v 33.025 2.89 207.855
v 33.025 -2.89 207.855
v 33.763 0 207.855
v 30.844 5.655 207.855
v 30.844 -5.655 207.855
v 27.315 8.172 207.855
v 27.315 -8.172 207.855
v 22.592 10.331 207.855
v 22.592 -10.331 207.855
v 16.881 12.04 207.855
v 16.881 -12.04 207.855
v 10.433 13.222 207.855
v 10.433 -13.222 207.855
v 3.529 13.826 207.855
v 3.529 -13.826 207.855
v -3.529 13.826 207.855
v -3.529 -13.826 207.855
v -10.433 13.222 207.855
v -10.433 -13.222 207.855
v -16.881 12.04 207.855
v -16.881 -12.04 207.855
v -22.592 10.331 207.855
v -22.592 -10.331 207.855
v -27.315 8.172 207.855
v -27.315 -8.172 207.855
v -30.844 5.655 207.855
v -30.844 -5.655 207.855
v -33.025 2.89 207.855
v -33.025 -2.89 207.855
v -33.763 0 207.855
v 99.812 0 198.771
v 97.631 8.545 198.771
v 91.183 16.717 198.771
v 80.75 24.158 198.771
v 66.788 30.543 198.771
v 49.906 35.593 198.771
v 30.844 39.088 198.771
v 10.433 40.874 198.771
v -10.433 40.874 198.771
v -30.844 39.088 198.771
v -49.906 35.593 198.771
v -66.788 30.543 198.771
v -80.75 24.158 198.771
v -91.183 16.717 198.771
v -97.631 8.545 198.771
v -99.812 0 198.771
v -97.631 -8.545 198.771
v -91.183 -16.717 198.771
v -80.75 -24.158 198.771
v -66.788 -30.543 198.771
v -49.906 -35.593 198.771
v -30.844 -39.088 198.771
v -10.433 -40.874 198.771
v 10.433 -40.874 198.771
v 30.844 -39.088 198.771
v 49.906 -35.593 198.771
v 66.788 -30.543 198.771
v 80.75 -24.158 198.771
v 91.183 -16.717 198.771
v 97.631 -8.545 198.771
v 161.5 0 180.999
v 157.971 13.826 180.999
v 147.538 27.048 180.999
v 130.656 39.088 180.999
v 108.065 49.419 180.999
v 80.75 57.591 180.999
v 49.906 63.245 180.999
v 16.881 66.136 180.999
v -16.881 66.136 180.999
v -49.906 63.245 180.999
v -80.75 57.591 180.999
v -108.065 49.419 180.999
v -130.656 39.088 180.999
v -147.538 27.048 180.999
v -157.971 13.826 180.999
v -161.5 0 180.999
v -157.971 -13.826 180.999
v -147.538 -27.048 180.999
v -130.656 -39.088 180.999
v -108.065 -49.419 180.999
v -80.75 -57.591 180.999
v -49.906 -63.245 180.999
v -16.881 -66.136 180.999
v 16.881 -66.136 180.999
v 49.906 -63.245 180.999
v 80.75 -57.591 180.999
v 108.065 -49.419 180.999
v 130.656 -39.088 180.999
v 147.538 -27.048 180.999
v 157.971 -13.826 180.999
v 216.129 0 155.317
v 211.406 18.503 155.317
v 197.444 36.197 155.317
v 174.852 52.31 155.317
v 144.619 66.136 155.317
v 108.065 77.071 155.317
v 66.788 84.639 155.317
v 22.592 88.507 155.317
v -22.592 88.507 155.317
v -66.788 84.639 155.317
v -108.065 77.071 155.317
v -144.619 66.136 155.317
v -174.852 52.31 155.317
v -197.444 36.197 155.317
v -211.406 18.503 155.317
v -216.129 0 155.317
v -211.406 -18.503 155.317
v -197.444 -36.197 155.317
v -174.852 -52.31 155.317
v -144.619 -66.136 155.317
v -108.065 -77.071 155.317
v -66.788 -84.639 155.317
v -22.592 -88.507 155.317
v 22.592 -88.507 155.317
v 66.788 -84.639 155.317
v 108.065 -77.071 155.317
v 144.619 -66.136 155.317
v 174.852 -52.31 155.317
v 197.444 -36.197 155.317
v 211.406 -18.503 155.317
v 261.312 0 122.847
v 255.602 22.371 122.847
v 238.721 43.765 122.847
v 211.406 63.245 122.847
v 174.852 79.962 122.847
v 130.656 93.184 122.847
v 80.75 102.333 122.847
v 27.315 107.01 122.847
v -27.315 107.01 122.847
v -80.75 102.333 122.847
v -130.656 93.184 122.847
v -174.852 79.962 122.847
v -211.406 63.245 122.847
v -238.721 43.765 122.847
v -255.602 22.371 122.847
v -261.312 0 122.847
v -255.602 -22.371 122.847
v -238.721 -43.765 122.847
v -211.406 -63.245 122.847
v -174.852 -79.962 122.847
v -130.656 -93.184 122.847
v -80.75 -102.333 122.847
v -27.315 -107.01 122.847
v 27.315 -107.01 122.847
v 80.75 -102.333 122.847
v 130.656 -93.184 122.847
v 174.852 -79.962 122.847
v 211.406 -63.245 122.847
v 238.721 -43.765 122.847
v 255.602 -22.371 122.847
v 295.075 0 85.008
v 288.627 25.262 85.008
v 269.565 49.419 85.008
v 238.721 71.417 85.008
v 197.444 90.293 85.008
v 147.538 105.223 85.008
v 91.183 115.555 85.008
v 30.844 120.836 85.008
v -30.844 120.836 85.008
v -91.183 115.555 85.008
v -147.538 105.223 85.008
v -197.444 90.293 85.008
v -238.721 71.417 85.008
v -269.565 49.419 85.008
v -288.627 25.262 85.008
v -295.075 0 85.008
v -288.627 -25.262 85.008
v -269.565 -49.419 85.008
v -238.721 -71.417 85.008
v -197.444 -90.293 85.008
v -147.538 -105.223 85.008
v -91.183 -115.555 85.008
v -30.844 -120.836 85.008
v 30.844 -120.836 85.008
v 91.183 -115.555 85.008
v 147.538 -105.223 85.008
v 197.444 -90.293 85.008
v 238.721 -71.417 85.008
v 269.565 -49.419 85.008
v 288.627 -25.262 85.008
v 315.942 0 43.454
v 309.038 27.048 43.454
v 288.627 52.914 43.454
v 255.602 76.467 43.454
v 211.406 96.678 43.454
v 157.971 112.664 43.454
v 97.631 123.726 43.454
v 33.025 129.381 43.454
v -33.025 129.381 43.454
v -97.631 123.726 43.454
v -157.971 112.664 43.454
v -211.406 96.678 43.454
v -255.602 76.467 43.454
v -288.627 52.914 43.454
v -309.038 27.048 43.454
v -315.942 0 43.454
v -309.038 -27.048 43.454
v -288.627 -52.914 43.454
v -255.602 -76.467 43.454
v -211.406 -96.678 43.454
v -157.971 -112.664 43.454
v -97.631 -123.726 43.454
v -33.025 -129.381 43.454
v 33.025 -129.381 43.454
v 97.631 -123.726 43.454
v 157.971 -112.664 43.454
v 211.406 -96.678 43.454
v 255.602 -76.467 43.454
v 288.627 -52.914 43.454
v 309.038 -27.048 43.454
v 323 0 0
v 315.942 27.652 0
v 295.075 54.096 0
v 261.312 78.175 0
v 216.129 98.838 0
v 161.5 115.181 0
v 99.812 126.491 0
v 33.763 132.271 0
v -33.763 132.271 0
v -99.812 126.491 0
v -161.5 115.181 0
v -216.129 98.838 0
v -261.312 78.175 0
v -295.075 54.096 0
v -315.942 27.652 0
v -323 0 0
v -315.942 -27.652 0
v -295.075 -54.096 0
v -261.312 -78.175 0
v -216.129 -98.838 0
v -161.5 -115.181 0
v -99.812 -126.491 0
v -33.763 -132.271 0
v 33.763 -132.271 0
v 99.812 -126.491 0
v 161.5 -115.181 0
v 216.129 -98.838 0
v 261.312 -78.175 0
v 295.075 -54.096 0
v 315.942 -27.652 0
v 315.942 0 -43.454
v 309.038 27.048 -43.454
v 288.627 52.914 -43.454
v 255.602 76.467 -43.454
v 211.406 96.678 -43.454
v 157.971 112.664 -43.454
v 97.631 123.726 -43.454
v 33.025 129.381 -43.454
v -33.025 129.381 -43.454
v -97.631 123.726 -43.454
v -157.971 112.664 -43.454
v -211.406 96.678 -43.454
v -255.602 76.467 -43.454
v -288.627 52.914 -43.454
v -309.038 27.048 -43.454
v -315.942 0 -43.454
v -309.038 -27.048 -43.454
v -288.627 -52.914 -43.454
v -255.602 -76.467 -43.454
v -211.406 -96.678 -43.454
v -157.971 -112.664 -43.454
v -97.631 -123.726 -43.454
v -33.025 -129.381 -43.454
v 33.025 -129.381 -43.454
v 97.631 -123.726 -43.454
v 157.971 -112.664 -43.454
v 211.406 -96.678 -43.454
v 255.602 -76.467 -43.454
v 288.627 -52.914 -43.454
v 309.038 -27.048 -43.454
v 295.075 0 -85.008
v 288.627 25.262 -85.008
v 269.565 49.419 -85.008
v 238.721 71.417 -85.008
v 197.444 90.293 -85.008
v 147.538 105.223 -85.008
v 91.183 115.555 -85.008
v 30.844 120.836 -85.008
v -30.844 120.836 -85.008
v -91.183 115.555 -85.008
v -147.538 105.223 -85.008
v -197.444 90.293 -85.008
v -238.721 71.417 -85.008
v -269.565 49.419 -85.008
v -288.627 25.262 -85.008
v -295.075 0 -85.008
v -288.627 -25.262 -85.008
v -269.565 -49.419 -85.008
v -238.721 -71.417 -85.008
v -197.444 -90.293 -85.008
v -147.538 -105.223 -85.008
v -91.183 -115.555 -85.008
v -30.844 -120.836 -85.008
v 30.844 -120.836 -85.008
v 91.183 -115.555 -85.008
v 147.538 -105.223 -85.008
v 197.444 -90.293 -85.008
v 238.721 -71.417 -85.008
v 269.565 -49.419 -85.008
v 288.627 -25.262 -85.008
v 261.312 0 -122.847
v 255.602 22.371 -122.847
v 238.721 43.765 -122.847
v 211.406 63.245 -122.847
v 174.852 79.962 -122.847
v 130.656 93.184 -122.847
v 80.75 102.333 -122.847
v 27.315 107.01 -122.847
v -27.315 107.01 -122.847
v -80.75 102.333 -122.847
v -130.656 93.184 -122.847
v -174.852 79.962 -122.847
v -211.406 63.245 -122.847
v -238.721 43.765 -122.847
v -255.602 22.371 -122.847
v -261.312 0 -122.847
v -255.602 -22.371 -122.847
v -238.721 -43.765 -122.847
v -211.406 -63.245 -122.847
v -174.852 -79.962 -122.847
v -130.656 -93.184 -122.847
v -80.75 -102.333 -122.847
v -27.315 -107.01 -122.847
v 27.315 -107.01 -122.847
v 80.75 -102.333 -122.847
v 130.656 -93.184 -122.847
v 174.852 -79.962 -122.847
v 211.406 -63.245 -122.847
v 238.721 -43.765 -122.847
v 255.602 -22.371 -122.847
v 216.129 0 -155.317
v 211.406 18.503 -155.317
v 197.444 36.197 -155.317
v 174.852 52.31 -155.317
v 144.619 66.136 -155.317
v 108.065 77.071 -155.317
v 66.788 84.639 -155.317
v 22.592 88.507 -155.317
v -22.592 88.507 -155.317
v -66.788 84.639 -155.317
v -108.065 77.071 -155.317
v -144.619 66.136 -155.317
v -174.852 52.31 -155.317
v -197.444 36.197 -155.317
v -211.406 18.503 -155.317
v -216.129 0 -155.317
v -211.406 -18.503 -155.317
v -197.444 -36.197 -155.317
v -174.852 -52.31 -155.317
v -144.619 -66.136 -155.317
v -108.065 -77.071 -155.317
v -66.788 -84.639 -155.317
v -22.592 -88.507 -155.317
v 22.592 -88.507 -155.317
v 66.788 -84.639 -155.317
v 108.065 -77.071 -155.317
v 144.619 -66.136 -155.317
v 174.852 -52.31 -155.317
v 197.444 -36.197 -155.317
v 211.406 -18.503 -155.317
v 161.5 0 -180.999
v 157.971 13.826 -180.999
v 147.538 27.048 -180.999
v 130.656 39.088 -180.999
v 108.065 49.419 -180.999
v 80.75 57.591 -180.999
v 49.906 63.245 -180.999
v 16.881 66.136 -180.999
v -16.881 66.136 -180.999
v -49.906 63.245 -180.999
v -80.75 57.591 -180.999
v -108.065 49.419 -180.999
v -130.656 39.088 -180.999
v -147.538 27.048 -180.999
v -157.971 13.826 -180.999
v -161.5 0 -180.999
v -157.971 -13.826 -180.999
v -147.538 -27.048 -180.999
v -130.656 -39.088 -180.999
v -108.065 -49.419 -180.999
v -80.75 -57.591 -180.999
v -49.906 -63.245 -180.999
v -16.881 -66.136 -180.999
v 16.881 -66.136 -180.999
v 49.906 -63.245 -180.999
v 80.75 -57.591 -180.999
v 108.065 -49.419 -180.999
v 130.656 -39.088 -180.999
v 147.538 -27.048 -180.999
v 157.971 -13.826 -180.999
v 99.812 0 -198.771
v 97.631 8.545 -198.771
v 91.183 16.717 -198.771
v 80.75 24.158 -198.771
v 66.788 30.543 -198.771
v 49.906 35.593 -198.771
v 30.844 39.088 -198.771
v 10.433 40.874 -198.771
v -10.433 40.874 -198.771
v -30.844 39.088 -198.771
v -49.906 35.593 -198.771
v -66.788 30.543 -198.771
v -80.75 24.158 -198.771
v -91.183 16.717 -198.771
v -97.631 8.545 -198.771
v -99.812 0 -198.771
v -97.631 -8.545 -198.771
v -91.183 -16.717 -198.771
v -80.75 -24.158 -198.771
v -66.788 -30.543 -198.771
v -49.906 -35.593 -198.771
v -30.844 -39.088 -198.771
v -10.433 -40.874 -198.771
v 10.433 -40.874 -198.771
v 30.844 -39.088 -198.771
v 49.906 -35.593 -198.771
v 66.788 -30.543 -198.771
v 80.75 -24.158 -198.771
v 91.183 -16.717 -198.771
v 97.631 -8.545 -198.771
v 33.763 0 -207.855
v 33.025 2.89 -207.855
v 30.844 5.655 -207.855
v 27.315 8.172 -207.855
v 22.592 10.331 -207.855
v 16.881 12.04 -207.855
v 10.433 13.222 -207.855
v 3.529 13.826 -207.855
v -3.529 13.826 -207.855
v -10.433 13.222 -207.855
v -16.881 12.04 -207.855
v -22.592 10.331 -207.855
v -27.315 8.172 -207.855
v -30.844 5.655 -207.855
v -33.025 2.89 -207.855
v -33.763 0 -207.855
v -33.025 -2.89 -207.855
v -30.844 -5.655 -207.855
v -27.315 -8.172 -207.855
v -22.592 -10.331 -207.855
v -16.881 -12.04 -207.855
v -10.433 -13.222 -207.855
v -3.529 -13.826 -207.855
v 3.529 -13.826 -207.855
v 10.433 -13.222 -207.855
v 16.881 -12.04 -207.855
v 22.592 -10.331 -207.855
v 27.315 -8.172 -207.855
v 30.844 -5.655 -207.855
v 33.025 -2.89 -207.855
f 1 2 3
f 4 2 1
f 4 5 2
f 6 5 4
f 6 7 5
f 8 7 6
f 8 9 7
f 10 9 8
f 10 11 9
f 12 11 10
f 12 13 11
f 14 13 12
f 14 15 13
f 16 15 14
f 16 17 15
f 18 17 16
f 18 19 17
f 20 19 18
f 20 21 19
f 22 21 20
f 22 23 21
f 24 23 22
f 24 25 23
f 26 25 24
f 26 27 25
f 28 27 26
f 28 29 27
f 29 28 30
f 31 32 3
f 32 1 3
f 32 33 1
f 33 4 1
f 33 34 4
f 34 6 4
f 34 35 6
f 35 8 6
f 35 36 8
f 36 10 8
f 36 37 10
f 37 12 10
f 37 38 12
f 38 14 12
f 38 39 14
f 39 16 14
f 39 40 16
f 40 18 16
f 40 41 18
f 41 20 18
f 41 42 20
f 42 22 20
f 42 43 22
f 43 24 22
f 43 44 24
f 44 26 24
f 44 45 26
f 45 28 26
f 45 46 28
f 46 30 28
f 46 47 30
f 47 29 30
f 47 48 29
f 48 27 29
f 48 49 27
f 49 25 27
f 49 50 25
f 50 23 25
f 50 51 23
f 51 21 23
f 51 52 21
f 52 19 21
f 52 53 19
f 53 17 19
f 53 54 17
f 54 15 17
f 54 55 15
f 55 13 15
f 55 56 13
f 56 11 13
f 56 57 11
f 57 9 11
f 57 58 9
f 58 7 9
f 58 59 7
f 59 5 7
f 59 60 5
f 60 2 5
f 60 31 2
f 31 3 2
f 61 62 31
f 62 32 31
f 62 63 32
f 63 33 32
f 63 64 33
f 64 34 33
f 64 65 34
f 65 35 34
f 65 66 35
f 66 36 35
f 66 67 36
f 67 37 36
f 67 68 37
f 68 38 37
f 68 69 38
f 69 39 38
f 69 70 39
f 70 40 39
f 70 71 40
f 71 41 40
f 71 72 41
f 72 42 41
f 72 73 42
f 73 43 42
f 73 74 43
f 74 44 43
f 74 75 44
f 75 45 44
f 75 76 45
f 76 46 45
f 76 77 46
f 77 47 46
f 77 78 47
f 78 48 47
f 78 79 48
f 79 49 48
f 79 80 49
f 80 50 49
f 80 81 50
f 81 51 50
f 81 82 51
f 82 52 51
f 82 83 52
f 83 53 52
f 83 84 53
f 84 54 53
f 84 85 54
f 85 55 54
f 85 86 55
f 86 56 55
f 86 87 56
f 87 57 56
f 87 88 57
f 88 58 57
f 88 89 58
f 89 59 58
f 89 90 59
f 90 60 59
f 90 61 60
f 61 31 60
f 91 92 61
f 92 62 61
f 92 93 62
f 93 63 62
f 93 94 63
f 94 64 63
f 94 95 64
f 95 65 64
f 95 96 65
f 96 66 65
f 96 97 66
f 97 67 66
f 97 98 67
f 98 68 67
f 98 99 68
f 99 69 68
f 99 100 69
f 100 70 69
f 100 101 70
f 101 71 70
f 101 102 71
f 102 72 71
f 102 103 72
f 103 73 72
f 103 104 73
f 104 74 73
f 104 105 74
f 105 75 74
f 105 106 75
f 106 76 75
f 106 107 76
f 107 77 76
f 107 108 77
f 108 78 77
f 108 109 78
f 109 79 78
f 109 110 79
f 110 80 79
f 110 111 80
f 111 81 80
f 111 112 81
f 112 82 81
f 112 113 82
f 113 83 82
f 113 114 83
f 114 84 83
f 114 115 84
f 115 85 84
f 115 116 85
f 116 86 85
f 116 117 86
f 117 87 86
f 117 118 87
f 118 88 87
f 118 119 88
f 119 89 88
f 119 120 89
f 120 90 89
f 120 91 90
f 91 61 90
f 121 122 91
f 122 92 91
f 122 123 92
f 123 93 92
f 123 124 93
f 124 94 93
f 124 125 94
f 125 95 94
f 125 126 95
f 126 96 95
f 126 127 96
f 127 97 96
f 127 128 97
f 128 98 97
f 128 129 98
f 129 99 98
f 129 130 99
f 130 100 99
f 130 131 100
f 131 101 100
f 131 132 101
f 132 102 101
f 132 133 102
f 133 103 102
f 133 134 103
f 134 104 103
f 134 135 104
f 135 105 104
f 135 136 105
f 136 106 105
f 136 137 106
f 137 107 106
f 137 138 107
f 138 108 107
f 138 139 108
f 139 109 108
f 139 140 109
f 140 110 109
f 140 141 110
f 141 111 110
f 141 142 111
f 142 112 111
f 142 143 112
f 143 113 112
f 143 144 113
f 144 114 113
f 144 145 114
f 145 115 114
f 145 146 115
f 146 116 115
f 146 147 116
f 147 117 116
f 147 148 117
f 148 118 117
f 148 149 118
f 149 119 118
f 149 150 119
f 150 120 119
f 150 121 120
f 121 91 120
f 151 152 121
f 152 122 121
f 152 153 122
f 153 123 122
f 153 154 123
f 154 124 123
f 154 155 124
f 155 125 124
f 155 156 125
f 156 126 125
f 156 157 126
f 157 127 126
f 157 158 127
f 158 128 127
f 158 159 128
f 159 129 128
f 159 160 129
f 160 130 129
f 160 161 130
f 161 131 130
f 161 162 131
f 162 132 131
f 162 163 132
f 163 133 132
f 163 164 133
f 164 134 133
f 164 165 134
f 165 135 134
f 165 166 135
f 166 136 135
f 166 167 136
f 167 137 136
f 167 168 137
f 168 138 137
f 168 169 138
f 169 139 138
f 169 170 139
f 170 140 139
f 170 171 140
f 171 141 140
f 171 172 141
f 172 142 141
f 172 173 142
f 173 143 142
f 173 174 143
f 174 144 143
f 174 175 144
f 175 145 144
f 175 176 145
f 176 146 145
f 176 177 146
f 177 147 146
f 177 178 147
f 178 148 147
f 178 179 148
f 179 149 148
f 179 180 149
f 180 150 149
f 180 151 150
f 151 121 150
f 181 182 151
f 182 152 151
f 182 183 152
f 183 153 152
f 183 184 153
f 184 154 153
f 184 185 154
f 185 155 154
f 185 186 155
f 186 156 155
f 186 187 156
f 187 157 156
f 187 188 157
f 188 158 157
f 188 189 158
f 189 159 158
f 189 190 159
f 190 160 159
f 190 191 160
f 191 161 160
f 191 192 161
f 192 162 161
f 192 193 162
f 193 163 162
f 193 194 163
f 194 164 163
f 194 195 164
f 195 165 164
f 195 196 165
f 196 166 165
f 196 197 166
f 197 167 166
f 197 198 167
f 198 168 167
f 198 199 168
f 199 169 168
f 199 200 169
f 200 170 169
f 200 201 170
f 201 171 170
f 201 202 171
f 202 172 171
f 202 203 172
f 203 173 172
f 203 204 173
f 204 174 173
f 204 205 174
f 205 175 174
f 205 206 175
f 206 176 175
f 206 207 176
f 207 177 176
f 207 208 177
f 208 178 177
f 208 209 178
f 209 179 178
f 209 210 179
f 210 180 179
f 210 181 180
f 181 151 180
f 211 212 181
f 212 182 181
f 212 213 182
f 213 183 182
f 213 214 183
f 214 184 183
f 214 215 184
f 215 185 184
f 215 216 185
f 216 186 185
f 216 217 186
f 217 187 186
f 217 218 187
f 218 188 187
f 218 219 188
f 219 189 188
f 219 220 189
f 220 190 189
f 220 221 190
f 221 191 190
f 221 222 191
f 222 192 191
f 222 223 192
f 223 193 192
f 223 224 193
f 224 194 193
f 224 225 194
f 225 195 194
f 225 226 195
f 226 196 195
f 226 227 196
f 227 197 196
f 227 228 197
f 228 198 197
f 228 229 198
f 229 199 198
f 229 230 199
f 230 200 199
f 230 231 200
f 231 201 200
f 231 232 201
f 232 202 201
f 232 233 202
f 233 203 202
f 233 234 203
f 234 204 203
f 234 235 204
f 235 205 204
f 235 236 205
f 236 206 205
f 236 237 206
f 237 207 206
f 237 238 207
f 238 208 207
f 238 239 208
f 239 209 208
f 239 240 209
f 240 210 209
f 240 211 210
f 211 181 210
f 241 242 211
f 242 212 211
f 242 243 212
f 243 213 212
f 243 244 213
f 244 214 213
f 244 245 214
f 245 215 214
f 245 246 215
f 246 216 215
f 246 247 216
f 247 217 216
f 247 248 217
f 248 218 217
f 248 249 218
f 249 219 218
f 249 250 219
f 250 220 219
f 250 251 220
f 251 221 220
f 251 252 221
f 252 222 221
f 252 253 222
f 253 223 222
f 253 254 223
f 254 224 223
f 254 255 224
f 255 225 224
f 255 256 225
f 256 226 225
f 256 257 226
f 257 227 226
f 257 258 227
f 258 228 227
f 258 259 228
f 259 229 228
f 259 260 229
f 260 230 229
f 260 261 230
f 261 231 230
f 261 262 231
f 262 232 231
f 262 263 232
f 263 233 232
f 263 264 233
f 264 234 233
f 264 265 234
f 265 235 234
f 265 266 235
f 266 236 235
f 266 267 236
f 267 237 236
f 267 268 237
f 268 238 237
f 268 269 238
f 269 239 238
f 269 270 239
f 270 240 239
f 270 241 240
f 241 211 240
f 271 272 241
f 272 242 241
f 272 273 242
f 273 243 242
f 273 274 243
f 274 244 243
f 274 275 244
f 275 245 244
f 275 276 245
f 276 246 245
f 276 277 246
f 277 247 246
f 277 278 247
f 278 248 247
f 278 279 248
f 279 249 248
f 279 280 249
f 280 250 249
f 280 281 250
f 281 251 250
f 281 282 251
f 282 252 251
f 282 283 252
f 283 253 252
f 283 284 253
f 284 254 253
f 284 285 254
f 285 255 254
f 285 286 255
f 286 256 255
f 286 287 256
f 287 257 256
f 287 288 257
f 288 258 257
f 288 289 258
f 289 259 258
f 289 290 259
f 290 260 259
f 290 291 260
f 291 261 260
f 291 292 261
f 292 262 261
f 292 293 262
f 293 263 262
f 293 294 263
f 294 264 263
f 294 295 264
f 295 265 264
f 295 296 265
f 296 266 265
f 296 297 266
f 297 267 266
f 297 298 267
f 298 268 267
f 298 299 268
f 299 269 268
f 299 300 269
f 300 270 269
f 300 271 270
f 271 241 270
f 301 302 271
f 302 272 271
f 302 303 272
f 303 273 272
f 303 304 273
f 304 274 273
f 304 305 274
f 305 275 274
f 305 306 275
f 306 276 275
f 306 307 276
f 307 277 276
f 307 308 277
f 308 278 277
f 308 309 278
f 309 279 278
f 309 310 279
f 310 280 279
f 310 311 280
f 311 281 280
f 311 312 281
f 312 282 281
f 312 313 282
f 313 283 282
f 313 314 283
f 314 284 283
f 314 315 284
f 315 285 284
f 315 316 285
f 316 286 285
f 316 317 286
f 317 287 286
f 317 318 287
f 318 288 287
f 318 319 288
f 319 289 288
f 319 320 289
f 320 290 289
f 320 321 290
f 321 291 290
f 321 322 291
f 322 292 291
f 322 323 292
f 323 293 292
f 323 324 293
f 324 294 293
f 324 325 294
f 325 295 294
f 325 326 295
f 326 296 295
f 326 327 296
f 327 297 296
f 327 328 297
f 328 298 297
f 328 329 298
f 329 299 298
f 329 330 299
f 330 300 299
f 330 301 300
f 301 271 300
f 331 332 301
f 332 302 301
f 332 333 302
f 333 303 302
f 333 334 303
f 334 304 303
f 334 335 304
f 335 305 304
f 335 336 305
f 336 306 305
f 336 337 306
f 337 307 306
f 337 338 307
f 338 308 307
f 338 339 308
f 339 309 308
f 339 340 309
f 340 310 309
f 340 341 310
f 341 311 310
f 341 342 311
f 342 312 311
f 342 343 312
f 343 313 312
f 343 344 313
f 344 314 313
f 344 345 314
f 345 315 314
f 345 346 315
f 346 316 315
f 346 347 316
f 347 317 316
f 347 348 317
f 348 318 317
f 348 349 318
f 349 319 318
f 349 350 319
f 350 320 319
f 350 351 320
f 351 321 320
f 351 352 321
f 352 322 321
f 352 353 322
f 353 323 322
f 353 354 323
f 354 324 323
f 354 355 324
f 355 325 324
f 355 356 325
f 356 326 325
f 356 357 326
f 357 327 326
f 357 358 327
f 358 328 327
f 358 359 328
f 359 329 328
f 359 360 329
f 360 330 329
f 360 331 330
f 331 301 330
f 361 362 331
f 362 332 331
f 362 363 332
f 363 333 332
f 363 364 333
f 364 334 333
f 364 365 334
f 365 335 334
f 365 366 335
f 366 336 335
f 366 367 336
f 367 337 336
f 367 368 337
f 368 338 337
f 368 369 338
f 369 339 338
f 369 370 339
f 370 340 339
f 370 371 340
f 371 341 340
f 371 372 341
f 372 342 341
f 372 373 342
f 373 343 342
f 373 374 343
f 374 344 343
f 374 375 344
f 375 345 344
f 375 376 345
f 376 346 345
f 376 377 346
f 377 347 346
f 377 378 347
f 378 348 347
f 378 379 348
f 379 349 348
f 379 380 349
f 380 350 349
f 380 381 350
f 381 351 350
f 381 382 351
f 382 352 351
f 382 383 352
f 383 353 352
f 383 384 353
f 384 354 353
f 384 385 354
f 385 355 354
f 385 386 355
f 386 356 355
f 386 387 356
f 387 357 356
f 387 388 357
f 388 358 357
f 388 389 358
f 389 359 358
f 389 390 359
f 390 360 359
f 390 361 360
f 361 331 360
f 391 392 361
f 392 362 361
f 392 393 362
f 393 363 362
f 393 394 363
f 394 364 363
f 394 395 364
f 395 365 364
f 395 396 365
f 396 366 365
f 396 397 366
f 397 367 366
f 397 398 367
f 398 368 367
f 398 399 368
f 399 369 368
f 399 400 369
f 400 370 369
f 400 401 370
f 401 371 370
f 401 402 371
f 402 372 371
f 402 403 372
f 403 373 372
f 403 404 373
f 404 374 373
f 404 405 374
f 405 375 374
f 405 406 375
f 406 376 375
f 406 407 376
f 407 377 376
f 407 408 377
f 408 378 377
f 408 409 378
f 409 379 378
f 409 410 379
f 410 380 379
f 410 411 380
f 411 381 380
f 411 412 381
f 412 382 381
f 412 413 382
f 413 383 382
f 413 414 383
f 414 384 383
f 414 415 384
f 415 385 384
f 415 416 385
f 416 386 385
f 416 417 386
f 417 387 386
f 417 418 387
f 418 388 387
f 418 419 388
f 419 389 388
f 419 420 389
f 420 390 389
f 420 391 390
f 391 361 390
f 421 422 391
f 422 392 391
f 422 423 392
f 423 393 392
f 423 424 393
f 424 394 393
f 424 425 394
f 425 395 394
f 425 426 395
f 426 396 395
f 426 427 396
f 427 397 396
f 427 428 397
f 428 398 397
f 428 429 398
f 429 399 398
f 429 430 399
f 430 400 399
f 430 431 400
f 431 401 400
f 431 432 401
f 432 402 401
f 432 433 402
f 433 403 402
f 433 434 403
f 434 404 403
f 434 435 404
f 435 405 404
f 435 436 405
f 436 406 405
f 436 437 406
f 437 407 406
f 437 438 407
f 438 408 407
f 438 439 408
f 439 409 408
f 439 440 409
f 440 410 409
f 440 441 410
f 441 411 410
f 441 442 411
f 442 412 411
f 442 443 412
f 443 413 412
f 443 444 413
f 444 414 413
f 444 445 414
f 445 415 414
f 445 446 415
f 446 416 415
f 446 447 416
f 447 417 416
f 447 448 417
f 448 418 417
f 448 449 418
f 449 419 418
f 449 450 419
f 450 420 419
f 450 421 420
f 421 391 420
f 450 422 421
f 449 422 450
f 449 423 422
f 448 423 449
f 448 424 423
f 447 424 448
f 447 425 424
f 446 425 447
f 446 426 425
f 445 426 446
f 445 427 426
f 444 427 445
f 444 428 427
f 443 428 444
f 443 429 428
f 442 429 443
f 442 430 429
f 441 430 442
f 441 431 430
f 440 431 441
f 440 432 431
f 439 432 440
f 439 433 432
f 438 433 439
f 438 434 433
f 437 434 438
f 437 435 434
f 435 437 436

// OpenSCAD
// Generated by SolidPython 1.0.1 on 2020-07-29 00:46:52


scale(v = [17, 7, 11]) {
	sphere(r = 19);
}
/***********************************************
*********      SolidPython code:      **********
************************************************
 
# import packages: SolidPython
from solid import *
from solid.utils import *
from itertools import chain, combinations, permutations


class Resize:

    def __init__(self, scad_file):
        self.scad_file = scad_file
        #self.scad_file = import_scad(scad_file)
        # cone/cylinder param:
        self.r1 = 0
        self.r2 = 0
        self.h = 0
        # rectangular prism param:
        self.w = 0
        self.l = 0
        # ellipse param:
        self.r = 0

    # import OpenScad code (file name corresponds to shape)


    # classify shape + parameters
    def assign(self, param1, param2, param3):
        if self.scad_file == 'cone.scad':
            self.r1 = param1
            self.r2 = param2
            self.h = param3
        elif self.scad_file == 'cylinder.scad':
            self.r1 = param1
            self.r2 = param2
            self.h = param3
        elif self.scad_file == 'rectangularPrism.scad':
            self.h = param1
            self.l = param2
            self.w = param3
        else:
            self.r = param1
            self.h = param2

    # resize parameters
    def iterate(self):
        x = range(3, 20, 2)
        i = 1
        if self.scad_file == 'cone.scad':
            tempList = list(permutations(x, 2))
            for temp in tempList:
                param1 = temp[0]
                param2 = temp[1]
                filepath = 'produced_scad_files/' + 'cone' + str(param1) + '_' + str(param2) + '_' + '.scad'
                scad_render_to_file(cylinder(h=param1, r1=param2, r2=0), filepath)

        elif self.scad_file == 'cylinder.scad':
            tempList = list(permutations(x, 3))
            for temp in tempList:
                param1 = temp[0]
                param2 = temp[1]
                filepath = 'produced_scad_files/' + 'cylinder' + str(param1) + '_' + str(param2) + '_' + '.scad'
                scad_render_to_file(cylinder(h=param1, r1=param2, r2=param2), filepath)

        elif self.scad_file == 'rectangularPrism.scad':
            tempList = list(permutations(x, 3))
            for temp in tempList:
                param1 = temp[0]
                param2 = temp[1]
                param3 = temp[2]
                filepath = 'produced_scad_files/' + 'rectangularPrism' + str(param1) + '_' + str(param2) + '_' + str(
                    param3) + '.scad'
                scad_render_to_file(cube(size=(param1, param2, param3)), filepath)

        elif self.scad_file == 'ellipse.scad':
            tempList = list(permutations(x, 4))
            for temp in tempList:
                param1 = temp[0]
                param2 = temp[1]
                param3 = temp[2]
                param4 = temp[3]
                filepath = 'produced_scad_files/' + 'ellipse' + str(param1) + '_' + str(param2) + '_' + str(param3) + '_' + str(param4) + '.scad'
                scad_render_to_file(scale([param1, param2, param3])(sphere(r=param4)), filepath)

    def render_to_scadfile(self):
        scad_render_to_file(scad, 'example.scad') 
 
************************************************/
